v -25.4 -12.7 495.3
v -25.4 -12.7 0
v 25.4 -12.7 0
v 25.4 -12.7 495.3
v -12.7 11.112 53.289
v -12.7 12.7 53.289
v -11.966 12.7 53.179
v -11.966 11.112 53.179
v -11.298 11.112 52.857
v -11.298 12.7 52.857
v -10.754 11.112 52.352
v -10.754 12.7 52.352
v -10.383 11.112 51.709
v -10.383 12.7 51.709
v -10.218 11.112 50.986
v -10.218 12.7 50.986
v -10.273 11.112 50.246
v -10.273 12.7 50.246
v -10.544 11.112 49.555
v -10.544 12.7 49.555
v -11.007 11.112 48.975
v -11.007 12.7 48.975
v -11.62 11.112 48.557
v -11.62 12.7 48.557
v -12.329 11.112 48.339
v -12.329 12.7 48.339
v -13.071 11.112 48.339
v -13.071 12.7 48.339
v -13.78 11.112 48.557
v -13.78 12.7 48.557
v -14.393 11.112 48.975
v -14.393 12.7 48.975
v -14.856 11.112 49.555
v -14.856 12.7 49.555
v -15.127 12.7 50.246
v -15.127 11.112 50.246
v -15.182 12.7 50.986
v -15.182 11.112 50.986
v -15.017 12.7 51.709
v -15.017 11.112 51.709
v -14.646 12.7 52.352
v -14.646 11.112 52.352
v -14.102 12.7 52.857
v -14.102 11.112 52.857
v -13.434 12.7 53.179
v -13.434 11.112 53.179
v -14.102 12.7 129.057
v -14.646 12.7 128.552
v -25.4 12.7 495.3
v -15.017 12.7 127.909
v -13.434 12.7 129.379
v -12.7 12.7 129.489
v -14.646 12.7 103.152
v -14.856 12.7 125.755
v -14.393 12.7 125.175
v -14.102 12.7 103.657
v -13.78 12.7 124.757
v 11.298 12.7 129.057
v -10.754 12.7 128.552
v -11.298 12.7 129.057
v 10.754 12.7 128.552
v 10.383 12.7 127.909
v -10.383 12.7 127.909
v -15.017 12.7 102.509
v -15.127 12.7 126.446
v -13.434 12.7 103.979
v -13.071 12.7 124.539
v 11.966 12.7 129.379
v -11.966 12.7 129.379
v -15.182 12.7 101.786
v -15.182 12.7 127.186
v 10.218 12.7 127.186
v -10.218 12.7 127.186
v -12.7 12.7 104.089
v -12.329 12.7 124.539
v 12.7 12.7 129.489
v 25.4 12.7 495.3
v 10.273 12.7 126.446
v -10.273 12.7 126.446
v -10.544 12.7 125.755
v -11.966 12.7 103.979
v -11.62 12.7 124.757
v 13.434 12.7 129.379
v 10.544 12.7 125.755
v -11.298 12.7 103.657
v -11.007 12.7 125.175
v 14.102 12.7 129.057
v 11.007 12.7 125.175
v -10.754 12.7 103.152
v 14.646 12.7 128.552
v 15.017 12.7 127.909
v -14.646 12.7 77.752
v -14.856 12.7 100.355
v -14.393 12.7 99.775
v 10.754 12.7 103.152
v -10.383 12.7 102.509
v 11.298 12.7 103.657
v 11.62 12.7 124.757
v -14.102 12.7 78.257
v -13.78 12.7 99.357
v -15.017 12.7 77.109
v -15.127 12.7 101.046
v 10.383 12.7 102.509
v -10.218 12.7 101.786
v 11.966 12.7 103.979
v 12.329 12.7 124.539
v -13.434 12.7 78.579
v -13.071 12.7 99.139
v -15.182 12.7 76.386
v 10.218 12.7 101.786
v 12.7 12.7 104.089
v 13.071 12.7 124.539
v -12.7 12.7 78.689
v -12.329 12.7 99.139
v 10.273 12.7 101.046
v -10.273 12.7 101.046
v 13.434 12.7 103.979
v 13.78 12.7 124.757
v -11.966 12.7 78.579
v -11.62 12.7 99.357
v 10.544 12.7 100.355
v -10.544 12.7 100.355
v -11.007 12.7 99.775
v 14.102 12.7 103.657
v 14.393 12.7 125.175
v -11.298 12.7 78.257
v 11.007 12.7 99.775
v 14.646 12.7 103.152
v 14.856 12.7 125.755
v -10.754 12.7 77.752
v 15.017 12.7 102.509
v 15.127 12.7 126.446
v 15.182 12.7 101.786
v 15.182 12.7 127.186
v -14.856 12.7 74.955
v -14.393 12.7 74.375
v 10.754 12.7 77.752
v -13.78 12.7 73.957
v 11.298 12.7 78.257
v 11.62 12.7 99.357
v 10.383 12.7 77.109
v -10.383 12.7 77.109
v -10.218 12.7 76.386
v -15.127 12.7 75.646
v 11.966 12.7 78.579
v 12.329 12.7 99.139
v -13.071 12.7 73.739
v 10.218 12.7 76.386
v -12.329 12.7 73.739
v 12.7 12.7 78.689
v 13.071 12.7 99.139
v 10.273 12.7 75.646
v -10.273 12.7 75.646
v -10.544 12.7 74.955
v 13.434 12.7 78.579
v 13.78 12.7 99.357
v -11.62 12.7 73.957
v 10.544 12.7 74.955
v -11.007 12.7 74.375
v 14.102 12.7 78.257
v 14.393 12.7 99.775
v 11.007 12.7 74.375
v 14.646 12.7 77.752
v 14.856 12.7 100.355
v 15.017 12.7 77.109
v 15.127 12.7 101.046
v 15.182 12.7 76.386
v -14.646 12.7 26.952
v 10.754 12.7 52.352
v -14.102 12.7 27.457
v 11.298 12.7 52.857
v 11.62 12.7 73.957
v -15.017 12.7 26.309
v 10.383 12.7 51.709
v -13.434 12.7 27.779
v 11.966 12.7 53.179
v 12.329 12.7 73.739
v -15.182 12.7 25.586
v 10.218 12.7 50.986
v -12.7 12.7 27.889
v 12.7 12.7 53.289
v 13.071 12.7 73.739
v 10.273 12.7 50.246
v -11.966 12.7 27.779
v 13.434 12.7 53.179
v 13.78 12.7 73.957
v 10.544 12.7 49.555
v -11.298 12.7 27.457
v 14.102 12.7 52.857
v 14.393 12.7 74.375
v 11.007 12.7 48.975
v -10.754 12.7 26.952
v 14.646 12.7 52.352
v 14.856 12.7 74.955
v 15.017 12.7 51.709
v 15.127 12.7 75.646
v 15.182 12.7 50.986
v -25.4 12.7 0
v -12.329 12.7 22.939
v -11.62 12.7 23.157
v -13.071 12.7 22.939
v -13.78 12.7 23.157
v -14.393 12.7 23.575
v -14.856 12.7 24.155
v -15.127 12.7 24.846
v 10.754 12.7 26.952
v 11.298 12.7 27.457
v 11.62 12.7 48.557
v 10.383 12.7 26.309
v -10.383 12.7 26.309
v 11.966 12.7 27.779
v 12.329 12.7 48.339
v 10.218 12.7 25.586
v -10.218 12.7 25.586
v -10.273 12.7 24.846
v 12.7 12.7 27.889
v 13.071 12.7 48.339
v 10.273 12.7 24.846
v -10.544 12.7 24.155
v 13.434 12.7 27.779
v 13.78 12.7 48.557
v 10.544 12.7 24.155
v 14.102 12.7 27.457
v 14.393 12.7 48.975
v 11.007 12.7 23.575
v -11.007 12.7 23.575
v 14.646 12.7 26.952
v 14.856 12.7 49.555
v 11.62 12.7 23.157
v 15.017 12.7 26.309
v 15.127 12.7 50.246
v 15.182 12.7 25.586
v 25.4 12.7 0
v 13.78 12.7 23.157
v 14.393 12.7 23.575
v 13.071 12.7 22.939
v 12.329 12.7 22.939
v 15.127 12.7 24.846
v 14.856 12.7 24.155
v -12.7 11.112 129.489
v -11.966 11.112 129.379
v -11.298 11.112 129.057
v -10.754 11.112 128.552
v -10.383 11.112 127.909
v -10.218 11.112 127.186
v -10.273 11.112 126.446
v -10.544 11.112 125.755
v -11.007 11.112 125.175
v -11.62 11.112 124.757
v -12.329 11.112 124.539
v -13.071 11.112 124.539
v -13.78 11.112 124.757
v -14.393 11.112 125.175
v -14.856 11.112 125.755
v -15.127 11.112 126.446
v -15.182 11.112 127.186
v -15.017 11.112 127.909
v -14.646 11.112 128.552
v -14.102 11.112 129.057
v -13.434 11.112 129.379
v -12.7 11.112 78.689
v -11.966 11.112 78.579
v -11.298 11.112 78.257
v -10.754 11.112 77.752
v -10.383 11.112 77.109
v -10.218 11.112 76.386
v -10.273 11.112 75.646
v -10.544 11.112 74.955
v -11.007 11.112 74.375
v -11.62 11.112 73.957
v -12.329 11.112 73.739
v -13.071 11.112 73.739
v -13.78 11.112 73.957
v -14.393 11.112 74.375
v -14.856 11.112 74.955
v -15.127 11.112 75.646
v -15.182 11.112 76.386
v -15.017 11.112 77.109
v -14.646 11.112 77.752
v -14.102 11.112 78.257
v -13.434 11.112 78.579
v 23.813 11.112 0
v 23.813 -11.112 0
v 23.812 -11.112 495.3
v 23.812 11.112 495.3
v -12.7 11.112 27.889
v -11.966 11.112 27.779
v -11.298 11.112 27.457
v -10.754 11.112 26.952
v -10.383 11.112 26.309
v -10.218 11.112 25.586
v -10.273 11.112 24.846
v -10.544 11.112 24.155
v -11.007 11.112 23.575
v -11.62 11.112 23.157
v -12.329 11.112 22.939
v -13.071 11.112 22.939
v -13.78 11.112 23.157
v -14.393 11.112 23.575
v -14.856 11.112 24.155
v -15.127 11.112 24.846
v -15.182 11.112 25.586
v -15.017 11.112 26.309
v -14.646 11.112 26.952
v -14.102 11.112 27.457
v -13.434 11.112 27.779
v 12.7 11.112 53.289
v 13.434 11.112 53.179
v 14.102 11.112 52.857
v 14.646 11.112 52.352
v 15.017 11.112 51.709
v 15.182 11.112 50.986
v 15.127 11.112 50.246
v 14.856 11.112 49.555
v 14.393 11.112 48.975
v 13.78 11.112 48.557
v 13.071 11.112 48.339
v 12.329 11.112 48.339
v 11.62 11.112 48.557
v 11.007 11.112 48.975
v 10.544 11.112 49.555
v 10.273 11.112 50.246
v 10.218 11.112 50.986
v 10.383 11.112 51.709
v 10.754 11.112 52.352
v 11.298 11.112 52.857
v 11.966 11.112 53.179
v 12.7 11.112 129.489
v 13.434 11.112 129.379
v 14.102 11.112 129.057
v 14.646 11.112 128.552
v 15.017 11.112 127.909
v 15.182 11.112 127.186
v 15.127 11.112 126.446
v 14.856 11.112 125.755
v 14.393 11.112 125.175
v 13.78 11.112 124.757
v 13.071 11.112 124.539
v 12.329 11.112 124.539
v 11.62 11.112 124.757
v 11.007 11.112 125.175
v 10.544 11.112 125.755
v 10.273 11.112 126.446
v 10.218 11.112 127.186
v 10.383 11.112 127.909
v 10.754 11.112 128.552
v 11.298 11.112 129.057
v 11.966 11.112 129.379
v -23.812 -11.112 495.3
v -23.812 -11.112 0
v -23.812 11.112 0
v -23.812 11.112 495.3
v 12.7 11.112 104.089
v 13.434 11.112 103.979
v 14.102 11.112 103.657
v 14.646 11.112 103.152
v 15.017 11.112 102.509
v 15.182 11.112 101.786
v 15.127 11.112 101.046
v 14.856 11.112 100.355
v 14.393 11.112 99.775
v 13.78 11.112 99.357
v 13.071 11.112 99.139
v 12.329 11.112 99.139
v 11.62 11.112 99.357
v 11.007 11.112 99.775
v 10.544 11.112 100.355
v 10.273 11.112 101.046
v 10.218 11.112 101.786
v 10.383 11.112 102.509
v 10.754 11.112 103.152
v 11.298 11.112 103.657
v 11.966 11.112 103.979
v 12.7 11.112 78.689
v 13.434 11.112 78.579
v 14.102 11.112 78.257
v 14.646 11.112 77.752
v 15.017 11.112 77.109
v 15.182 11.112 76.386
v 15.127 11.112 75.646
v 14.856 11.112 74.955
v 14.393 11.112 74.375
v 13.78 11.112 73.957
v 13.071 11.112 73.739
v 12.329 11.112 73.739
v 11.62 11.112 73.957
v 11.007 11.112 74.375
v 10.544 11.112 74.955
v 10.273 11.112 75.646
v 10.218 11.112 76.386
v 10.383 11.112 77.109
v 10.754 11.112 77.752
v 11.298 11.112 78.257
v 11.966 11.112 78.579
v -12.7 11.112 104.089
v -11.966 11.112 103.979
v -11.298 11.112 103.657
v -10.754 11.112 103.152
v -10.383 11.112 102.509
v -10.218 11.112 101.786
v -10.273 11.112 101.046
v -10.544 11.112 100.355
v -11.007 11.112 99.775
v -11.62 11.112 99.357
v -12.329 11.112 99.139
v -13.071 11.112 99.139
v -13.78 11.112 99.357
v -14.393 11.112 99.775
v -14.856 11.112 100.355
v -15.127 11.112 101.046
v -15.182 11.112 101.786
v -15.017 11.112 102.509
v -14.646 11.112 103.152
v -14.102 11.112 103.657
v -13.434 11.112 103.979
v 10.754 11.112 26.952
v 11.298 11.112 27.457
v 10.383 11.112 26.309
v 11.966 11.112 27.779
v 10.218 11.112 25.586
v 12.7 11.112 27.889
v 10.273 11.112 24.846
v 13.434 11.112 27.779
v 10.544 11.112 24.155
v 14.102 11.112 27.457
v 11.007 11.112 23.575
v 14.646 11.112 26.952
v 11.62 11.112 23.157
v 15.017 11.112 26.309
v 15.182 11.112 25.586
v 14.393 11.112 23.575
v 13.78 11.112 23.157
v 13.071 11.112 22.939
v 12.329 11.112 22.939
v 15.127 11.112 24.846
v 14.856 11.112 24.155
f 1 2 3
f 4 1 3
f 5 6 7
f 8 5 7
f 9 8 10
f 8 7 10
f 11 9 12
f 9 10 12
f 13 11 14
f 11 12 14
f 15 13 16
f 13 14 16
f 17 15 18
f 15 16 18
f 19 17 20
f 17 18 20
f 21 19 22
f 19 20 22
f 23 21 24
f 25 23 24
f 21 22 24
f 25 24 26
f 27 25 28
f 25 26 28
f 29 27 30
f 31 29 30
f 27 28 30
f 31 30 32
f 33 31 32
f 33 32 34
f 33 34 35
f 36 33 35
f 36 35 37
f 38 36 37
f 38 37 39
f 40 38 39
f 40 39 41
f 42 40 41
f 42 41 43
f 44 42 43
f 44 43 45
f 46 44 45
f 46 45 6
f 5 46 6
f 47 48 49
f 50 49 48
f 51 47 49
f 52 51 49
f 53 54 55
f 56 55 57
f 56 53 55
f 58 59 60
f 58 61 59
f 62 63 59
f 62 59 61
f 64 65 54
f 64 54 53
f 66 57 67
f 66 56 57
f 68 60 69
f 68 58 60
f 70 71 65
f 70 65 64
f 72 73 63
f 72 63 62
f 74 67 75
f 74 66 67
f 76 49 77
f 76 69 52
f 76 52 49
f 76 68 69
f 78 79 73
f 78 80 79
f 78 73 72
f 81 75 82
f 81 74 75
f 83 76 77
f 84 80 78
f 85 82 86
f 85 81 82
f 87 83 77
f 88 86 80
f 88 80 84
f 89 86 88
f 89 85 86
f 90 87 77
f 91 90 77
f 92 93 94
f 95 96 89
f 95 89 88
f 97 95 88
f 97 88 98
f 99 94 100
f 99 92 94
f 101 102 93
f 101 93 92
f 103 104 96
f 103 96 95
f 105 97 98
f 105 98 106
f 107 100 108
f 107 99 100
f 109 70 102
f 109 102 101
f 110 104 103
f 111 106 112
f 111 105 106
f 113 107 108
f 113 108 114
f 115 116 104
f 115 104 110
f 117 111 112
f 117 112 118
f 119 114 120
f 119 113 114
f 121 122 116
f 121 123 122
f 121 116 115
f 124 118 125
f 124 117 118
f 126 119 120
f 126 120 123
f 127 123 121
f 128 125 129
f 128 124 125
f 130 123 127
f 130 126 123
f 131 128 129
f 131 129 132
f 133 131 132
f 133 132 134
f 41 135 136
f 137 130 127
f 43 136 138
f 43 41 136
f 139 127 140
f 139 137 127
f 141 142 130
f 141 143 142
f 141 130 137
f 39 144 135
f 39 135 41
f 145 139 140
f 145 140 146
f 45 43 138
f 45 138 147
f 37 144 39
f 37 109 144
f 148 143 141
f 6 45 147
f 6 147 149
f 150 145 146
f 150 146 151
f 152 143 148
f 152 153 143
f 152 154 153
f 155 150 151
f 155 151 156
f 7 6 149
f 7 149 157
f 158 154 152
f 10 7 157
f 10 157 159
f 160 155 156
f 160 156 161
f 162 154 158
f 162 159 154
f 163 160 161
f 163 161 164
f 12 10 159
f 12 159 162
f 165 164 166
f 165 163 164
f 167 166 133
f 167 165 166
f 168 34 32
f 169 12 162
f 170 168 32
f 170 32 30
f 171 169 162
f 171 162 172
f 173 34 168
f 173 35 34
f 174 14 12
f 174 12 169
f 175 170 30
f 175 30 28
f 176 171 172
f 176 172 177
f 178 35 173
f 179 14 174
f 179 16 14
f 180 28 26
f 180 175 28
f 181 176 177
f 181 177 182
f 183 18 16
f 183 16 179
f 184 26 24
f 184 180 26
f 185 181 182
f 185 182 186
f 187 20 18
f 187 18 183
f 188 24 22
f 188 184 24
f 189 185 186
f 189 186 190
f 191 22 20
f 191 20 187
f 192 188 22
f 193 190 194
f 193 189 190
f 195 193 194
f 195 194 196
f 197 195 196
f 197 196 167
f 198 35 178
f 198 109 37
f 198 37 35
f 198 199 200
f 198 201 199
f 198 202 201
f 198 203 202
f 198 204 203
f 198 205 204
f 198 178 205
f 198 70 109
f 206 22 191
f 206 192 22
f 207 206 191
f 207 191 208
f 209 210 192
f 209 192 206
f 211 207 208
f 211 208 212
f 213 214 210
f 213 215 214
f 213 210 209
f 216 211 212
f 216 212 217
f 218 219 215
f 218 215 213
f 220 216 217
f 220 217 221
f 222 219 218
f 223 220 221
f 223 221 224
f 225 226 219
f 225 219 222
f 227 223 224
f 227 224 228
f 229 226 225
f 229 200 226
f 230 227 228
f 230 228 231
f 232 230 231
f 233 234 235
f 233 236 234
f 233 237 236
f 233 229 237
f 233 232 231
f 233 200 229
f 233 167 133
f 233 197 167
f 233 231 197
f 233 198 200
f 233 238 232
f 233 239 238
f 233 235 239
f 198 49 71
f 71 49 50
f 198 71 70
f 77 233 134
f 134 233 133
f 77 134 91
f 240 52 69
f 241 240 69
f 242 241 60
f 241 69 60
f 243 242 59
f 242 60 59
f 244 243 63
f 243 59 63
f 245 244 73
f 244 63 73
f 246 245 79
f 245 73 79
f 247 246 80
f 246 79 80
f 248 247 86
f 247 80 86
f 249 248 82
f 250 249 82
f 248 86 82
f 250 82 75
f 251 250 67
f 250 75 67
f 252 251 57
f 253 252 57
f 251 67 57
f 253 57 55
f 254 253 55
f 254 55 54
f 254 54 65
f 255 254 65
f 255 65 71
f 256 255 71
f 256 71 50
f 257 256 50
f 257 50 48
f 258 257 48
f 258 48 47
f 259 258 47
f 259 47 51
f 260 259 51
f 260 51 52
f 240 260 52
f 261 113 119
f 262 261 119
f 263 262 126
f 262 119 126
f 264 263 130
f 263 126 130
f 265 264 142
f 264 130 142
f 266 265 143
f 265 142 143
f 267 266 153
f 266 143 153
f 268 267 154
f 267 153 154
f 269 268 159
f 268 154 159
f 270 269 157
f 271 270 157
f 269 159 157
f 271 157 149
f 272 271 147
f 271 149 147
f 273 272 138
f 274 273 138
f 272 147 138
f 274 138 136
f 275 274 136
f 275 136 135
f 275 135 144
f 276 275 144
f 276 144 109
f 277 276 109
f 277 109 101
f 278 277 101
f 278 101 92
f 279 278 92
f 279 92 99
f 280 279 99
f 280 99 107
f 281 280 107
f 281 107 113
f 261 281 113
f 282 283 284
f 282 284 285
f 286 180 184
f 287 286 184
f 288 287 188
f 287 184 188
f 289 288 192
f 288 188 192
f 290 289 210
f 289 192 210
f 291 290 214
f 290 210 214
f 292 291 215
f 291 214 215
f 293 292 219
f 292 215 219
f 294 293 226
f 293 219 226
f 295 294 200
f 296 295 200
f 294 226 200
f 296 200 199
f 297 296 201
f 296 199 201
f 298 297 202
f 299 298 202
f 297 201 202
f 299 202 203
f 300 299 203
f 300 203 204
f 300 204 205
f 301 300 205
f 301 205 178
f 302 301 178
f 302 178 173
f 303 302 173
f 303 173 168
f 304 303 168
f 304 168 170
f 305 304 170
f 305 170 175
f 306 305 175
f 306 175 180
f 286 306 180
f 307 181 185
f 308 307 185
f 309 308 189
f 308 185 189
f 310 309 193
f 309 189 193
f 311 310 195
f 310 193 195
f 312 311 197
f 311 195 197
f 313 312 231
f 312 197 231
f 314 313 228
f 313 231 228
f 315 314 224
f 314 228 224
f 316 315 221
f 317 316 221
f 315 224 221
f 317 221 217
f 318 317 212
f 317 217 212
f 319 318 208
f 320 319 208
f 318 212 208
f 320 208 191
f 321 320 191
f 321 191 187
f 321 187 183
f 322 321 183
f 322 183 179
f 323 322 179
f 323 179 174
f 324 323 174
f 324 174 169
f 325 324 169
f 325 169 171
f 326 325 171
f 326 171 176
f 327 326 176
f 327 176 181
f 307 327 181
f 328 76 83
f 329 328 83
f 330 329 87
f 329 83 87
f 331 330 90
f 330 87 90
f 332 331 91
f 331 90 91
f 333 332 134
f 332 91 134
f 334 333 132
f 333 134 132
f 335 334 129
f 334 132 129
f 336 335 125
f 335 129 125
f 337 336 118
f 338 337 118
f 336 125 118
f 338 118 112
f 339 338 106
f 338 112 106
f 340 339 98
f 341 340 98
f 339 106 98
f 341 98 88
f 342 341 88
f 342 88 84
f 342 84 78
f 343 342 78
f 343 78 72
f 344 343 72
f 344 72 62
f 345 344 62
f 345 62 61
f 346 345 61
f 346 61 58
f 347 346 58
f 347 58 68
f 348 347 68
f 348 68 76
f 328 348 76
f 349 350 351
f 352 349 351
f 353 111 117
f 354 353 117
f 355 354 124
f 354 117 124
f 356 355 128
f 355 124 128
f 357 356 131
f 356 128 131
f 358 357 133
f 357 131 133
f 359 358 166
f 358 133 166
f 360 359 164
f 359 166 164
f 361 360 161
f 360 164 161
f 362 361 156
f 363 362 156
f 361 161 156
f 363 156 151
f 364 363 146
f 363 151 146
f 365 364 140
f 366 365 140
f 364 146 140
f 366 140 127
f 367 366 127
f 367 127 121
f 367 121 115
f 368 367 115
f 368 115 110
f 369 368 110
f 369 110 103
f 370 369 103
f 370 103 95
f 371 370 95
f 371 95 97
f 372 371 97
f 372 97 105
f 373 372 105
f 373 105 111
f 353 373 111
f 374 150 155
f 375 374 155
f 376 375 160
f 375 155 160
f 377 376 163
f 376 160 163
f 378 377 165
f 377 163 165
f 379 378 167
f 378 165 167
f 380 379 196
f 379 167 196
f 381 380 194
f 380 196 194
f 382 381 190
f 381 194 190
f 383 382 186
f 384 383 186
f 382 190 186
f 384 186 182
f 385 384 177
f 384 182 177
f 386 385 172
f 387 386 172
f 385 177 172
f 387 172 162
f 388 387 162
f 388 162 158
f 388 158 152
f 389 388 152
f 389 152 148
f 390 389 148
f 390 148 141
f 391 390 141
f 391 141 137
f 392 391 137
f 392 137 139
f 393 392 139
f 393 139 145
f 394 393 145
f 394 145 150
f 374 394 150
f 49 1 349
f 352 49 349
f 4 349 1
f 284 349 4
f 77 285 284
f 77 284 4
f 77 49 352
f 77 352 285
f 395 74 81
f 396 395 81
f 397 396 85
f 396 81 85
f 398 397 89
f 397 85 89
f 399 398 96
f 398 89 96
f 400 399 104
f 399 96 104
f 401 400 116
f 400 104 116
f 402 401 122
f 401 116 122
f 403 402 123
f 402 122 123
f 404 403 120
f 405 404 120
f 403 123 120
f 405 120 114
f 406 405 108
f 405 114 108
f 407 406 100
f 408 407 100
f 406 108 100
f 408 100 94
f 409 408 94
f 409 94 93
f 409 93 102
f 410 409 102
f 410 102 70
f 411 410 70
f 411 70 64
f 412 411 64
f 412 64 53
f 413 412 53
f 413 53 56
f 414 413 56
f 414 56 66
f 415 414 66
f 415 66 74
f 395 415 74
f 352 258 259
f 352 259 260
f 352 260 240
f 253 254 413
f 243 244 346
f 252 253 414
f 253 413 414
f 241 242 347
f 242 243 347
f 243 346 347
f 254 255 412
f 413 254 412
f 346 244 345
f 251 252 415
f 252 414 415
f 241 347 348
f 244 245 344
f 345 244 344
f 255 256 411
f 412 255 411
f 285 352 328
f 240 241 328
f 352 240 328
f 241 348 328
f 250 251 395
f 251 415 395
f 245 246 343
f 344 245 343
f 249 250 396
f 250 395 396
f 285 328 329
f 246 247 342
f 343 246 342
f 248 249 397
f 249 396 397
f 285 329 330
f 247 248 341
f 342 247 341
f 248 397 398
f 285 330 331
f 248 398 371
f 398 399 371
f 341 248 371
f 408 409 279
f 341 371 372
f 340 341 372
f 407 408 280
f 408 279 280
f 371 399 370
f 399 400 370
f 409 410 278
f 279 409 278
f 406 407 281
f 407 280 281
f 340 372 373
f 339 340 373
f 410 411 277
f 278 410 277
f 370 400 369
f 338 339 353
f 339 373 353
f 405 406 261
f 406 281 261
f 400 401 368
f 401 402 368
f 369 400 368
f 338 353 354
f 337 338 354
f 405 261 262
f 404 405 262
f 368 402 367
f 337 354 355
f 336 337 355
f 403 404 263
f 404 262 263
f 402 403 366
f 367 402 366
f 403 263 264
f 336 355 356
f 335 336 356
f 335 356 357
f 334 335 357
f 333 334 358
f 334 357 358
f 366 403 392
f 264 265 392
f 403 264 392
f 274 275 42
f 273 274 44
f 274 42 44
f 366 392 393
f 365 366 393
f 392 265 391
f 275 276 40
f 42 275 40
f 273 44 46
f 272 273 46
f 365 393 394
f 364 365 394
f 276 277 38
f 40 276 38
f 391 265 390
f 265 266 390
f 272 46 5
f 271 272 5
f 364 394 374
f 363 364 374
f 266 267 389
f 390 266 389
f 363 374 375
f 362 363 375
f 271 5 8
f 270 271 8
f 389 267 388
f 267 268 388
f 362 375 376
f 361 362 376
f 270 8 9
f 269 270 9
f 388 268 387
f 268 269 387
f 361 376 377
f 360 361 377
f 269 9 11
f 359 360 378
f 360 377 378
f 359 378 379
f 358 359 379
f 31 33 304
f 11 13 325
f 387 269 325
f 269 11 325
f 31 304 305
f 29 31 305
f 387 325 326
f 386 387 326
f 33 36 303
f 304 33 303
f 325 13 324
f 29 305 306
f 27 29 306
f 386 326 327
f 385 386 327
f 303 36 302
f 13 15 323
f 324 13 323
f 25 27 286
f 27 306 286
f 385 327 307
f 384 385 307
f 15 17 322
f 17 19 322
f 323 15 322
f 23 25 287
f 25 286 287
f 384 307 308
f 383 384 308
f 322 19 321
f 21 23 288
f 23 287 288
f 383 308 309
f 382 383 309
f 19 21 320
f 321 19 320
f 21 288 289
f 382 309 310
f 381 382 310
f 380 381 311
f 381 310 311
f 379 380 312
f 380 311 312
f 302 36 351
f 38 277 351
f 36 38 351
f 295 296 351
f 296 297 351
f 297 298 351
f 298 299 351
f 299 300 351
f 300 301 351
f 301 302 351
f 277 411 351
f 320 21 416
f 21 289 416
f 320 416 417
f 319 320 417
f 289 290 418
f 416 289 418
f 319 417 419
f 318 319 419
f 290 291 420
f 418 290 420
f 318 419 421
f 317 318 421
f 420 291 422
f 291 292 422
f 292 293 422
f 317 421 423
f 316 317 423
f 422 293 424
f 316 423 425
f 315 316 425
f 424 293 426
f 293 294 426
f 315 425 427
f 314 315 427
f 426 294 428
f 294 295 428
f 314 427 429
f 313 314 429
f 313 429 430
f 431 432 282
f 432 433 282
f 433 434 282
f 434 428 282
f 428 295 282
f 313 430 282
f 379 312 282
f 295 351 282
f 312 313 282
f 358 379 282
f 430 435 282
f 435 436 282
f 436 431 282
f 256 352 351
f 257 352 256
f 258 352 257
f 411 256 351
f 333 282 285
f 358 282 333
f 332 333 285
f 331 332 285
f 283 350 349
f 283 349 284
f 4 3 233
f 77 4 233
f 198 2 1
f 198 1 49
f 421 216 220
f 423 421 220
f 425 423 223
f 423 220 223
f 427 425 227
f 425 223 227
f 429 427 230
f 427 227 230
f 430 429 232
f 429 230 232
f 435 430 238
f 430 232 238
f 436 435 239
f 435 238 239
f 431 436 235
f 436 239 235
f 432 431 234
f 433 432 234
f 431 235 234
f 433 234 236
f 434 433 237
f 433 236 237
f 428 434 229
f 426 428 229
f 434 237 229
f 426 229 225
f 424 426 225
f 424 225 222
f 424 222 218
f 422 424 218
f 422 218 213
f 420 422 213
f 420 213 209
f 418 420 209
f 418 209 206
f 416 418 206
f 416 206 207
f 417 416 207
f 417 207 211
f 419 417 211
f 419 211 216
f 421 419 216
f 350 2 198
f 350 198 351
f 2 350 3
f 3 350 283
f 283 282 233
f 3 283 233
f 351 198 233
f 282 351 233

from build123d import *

# Parameters (mm, degrees)
SKETCH1_W           = 50.8
SKETCH1_H           = 25.4
BOSS_EXTRUDE1_DEPTH = 495.3
SHELL1_T            = -1.5875
CUT_EXTRUDE1_REACH  = 498.601
SKETCH2_R           = 2.4892


with BuildPart() as part:
    # Sketch1 → Boss-Extrude1 (new body)
    with BuildSketch(Plane.XY):
        Rectangle(SKETCH1_W, SKETCH1_H)
    extrude(amount=BOSS_EXTRUDE1_DEPTH)

    # Shell1
    shell1_openings = [part.faces().sort_by_distance(p)[0] for p in [
        (0, 0, 495.3),
        (0, 0, 0),
    ]]
    offset(amount=SHELL1_T, openings=shell1_openings, kind=Kind.INTERSECTION)

    # Sketch2 → Cut-Extrude1 (cut, up to next)
    with BuildSketch(Plane(origin=(0, 12.7, 0), x_dir=(1, 0, 0), z_dir=(0, 1, 0)), mode=Mode.PRIVATE) as cut_extrude1_sk1:
        with Locations(Location((-12.7, -25.4, 0), (0, 0, 270))):
            Circle(SKETCH2_R)
    cut_extrude1_tool1 = extrude(cut_extrude1_sk1.sketch, amount=-CUT_EXTRUDE1_REACH, mode=Mode.PRIVATE) & part.part
    # Sketch2 → Cut-Extrude1 (cut, up to next)
    with BuildSketch(Plane(origin=(0, 12.7, 0), x_dir=(1, 0, 0), z_dir=(0, 1, 0)), mode=Mode.PRIVATE) as cut_extrude1_sk2:
        with Locations(Location((12.7, -25.4, 0), (0, 0, 270))):
            Circle(SKETCH2_R)
    cut_extrude1_tool2 = extrude(cut_extrude1_sk2.sketch, amount=-CUT_EXTRUDE1_REACH, mode=Mode.PRIVATE) & part.part
    # Sketch2 → Cut-Extrude1 (cut, up to next)
    with BuildSketch(Plane(origin=(0, 12.7, 0), x_dir=(1, 0, 0), z_dir=(0, 1, 0)), mode=Mode.PRIVATE) as cut_extrude1_sk3:
        with Locations(Location((12.7, -50.8, 0), (0, 0, 270))):
            Circle(SKETCH2_R)
    cut_extrude1_tool3 = extrude(cut_extrude1_sk3.sketch, amount=-CUT_EXTRUDE1_REACH, mode=Mode.PRIVATE) & part.part
    # Sketch2 → Cut-Extrude1 (cut, up to next)
    with BuildSketch(Plane(origin=(0, 12.7, 0), x_dir=(1, 0, 0), z_dir=(0, 1, 0)), mode=Mode.PRIVATE) as cut_extrude1_sk4:
        with Locations(Location((12.7, -76.2, 0), (0, 0, 270))):
            Circle(SKETCH2_R)
    cut_extrude1_tool4 = extrude(cut_extrude1_sk4.sketch, amount=-CUT_EXTRUDE1_REACH, mode=Mode.PRIVATE) & part.part
    # Sketch2 → Cut-Extrude1 (cut, up to next)
    with BuildSketch(Plane(origin=(0, 12.7, 0), x_dir=(1, 0, 0), z_dir=(0, 1, 0)), mode=Mode.PRIVATE) as cut_extrude1_sk5:
        with Locations(Location((12.7, -101.6, 0), (0, 0, 270))):
            Circle(SKETCH2_R)
    cut_extrude1_tool5 = extrude(cut_extrude1_sk5.sketch, amount=-CUT_EXTRUDE1_REACH, mode=Mode.PRIVATE) & part.part
    # Sketch2 → Cut-Extrude1 (cut, up to next)
    with BuildSketch(Plane(origin=(0, 12.7, 0), x_dir=(1, 0, 0), z_dir=(0, 1, 0)), mode=Mode.PRIVATE) as cut_extrude1_sk6:
        with Locations(Location((12.7, -127, 0), (0, 0, 270))):
            Circle(SKETCH2_R)
    cut_extrude1_tool6 = extrude(cut_extrude1_sk6.sketch, amount=-CUT_EXTRUDE1_REACH, mode=Mode.PRIVATE) & part.part
    # Sketch2 → Cut-Extrude1 (cut, up to next)
    with BuildSketch(Plane(origin=(0, 12.7, 0), x_dir=(1, 0, 0), z_dir=(0, 1, 0)), mode=Mode.PRIVATE) as cut_extrude1_sk7:
        with Locations(Location((-12.7, -50.8, 0), (0, 0, 270))):
            Circle(SKETCH2_R)
    cut_extrude1_tool7 = extrude(cut_extrude1_sk7.sketch, amount=-CUT_EXTRUDE1_REACH, mode=Mode.PRIVATE) & part.part
    # Sketch2 → Cut-Extrude1 (cut, up to next)
    with BuildSketch(Plane(origin=(0, 12.7, 0), x_dir=(1, 0, 0), z_dir=(0, 1, 0)), mode=Mode.PRIVATE) as cut_extrude1_sk8:
        with Locations(Location((-12.7, -76.2, 0), (0, 0, 270))):
            Circle(SKETCH2_R)
    cut_extrude1_tool8 = extrude(cut_extrude1_sk8.sketch, amount=-CUT_EXTRUDE1_REACH, mode=Mode.PRIVATE) & part.part
    # Sketch2 → Cut-Extrude1 (cut, up to next)
    with BuildSketch(Plane(origin=(0, 12.7, 0), x_dir=(1, 0, 0), z_dir=(0, 1, 0)), mode=Mode.PRIVATE) as cut_extrude1_sk9:
        with Locations(Location((-12.7, -101.6, 0), (0, 0, 270))):
            Circle(SKETCH2_R)
    cut_extrude1_tool9 = extrude(cut_extrude1_sk9.sketch, amount=-CUT_EXTRUDE1_REACH, mode=Mode.PRIVATE) & part.part
    # Sketch2 → Cut-Extrude1 (cut, up to next)
    with BuildSketch(Plane(origin=(0, 12.7, 0), x_dir=(1, 0, 0), z_dir=(0, 1, 0)), mode=Mode.PRIVATE) as cut_extrude1_sk10:
        with Locations(Location((-12.7, -127, 0), (0, 0, 270))):
            Circle(SKETCH2_R)
    cut_extrude1_tool10 = extrude(cut_extrude1_sk10.sketch, amount=-CUT_EXTRUDE1_REACH, mode=Mode.PRIVATE) & part.part
    add(cut_extrude1_tool1.solids().sort_by_distance((-12.7, 12.7, 25.4))[0], mode=Mode.SUBTRACT)
    add(cut_extrude1_tool2.solids().sort_by_distance((12.7, 12.7, 25.4))[0], mode=Mode.SUBTRACT)
    add(cut_extrude1_tool3.solids().sort_by_distance((12.7, 12.7, 50.8))[0], mode=Mode.SUBTRACT)
    add(cut_extrude1_tool4.solids().sort_by_distance((12.7, 12.7, 76.2))[0], mode=Mode.SUBTRACT)
    add(cut_extrude1_tool5.solids().sort_by_distance((12.7, 12.7, 101.6))[0], mode=Mode.SUBTRACT)
    add(cut_extrude1_tool6.solids().sort_by_distance((12.7, 12.7, 127))[0], mode=Mode.SUBTRACT)
    add(cut_extrude1_tool7.solids().sort_by_distance((-12.7, 12.7, 50.8))[0], mode=Mode.SUBTRACT)
    add(cut_extrude1_tool8.solids().sort_by_distance((-12.7, 12.7, 76.2))[0], mode=Mode.SUBTRACT)
    add(cut_extrude1_tool9.solids().sort_by_distance((-12.7, 12.7, 101.6))[0], mode=Mode.SUBTRACT)
    add(cut_extrude1_tool10.solids().sort_by_distance((-12.7, 12.7, 127))[0], mode=Mode.SUBTRACT)


solid = part.part
